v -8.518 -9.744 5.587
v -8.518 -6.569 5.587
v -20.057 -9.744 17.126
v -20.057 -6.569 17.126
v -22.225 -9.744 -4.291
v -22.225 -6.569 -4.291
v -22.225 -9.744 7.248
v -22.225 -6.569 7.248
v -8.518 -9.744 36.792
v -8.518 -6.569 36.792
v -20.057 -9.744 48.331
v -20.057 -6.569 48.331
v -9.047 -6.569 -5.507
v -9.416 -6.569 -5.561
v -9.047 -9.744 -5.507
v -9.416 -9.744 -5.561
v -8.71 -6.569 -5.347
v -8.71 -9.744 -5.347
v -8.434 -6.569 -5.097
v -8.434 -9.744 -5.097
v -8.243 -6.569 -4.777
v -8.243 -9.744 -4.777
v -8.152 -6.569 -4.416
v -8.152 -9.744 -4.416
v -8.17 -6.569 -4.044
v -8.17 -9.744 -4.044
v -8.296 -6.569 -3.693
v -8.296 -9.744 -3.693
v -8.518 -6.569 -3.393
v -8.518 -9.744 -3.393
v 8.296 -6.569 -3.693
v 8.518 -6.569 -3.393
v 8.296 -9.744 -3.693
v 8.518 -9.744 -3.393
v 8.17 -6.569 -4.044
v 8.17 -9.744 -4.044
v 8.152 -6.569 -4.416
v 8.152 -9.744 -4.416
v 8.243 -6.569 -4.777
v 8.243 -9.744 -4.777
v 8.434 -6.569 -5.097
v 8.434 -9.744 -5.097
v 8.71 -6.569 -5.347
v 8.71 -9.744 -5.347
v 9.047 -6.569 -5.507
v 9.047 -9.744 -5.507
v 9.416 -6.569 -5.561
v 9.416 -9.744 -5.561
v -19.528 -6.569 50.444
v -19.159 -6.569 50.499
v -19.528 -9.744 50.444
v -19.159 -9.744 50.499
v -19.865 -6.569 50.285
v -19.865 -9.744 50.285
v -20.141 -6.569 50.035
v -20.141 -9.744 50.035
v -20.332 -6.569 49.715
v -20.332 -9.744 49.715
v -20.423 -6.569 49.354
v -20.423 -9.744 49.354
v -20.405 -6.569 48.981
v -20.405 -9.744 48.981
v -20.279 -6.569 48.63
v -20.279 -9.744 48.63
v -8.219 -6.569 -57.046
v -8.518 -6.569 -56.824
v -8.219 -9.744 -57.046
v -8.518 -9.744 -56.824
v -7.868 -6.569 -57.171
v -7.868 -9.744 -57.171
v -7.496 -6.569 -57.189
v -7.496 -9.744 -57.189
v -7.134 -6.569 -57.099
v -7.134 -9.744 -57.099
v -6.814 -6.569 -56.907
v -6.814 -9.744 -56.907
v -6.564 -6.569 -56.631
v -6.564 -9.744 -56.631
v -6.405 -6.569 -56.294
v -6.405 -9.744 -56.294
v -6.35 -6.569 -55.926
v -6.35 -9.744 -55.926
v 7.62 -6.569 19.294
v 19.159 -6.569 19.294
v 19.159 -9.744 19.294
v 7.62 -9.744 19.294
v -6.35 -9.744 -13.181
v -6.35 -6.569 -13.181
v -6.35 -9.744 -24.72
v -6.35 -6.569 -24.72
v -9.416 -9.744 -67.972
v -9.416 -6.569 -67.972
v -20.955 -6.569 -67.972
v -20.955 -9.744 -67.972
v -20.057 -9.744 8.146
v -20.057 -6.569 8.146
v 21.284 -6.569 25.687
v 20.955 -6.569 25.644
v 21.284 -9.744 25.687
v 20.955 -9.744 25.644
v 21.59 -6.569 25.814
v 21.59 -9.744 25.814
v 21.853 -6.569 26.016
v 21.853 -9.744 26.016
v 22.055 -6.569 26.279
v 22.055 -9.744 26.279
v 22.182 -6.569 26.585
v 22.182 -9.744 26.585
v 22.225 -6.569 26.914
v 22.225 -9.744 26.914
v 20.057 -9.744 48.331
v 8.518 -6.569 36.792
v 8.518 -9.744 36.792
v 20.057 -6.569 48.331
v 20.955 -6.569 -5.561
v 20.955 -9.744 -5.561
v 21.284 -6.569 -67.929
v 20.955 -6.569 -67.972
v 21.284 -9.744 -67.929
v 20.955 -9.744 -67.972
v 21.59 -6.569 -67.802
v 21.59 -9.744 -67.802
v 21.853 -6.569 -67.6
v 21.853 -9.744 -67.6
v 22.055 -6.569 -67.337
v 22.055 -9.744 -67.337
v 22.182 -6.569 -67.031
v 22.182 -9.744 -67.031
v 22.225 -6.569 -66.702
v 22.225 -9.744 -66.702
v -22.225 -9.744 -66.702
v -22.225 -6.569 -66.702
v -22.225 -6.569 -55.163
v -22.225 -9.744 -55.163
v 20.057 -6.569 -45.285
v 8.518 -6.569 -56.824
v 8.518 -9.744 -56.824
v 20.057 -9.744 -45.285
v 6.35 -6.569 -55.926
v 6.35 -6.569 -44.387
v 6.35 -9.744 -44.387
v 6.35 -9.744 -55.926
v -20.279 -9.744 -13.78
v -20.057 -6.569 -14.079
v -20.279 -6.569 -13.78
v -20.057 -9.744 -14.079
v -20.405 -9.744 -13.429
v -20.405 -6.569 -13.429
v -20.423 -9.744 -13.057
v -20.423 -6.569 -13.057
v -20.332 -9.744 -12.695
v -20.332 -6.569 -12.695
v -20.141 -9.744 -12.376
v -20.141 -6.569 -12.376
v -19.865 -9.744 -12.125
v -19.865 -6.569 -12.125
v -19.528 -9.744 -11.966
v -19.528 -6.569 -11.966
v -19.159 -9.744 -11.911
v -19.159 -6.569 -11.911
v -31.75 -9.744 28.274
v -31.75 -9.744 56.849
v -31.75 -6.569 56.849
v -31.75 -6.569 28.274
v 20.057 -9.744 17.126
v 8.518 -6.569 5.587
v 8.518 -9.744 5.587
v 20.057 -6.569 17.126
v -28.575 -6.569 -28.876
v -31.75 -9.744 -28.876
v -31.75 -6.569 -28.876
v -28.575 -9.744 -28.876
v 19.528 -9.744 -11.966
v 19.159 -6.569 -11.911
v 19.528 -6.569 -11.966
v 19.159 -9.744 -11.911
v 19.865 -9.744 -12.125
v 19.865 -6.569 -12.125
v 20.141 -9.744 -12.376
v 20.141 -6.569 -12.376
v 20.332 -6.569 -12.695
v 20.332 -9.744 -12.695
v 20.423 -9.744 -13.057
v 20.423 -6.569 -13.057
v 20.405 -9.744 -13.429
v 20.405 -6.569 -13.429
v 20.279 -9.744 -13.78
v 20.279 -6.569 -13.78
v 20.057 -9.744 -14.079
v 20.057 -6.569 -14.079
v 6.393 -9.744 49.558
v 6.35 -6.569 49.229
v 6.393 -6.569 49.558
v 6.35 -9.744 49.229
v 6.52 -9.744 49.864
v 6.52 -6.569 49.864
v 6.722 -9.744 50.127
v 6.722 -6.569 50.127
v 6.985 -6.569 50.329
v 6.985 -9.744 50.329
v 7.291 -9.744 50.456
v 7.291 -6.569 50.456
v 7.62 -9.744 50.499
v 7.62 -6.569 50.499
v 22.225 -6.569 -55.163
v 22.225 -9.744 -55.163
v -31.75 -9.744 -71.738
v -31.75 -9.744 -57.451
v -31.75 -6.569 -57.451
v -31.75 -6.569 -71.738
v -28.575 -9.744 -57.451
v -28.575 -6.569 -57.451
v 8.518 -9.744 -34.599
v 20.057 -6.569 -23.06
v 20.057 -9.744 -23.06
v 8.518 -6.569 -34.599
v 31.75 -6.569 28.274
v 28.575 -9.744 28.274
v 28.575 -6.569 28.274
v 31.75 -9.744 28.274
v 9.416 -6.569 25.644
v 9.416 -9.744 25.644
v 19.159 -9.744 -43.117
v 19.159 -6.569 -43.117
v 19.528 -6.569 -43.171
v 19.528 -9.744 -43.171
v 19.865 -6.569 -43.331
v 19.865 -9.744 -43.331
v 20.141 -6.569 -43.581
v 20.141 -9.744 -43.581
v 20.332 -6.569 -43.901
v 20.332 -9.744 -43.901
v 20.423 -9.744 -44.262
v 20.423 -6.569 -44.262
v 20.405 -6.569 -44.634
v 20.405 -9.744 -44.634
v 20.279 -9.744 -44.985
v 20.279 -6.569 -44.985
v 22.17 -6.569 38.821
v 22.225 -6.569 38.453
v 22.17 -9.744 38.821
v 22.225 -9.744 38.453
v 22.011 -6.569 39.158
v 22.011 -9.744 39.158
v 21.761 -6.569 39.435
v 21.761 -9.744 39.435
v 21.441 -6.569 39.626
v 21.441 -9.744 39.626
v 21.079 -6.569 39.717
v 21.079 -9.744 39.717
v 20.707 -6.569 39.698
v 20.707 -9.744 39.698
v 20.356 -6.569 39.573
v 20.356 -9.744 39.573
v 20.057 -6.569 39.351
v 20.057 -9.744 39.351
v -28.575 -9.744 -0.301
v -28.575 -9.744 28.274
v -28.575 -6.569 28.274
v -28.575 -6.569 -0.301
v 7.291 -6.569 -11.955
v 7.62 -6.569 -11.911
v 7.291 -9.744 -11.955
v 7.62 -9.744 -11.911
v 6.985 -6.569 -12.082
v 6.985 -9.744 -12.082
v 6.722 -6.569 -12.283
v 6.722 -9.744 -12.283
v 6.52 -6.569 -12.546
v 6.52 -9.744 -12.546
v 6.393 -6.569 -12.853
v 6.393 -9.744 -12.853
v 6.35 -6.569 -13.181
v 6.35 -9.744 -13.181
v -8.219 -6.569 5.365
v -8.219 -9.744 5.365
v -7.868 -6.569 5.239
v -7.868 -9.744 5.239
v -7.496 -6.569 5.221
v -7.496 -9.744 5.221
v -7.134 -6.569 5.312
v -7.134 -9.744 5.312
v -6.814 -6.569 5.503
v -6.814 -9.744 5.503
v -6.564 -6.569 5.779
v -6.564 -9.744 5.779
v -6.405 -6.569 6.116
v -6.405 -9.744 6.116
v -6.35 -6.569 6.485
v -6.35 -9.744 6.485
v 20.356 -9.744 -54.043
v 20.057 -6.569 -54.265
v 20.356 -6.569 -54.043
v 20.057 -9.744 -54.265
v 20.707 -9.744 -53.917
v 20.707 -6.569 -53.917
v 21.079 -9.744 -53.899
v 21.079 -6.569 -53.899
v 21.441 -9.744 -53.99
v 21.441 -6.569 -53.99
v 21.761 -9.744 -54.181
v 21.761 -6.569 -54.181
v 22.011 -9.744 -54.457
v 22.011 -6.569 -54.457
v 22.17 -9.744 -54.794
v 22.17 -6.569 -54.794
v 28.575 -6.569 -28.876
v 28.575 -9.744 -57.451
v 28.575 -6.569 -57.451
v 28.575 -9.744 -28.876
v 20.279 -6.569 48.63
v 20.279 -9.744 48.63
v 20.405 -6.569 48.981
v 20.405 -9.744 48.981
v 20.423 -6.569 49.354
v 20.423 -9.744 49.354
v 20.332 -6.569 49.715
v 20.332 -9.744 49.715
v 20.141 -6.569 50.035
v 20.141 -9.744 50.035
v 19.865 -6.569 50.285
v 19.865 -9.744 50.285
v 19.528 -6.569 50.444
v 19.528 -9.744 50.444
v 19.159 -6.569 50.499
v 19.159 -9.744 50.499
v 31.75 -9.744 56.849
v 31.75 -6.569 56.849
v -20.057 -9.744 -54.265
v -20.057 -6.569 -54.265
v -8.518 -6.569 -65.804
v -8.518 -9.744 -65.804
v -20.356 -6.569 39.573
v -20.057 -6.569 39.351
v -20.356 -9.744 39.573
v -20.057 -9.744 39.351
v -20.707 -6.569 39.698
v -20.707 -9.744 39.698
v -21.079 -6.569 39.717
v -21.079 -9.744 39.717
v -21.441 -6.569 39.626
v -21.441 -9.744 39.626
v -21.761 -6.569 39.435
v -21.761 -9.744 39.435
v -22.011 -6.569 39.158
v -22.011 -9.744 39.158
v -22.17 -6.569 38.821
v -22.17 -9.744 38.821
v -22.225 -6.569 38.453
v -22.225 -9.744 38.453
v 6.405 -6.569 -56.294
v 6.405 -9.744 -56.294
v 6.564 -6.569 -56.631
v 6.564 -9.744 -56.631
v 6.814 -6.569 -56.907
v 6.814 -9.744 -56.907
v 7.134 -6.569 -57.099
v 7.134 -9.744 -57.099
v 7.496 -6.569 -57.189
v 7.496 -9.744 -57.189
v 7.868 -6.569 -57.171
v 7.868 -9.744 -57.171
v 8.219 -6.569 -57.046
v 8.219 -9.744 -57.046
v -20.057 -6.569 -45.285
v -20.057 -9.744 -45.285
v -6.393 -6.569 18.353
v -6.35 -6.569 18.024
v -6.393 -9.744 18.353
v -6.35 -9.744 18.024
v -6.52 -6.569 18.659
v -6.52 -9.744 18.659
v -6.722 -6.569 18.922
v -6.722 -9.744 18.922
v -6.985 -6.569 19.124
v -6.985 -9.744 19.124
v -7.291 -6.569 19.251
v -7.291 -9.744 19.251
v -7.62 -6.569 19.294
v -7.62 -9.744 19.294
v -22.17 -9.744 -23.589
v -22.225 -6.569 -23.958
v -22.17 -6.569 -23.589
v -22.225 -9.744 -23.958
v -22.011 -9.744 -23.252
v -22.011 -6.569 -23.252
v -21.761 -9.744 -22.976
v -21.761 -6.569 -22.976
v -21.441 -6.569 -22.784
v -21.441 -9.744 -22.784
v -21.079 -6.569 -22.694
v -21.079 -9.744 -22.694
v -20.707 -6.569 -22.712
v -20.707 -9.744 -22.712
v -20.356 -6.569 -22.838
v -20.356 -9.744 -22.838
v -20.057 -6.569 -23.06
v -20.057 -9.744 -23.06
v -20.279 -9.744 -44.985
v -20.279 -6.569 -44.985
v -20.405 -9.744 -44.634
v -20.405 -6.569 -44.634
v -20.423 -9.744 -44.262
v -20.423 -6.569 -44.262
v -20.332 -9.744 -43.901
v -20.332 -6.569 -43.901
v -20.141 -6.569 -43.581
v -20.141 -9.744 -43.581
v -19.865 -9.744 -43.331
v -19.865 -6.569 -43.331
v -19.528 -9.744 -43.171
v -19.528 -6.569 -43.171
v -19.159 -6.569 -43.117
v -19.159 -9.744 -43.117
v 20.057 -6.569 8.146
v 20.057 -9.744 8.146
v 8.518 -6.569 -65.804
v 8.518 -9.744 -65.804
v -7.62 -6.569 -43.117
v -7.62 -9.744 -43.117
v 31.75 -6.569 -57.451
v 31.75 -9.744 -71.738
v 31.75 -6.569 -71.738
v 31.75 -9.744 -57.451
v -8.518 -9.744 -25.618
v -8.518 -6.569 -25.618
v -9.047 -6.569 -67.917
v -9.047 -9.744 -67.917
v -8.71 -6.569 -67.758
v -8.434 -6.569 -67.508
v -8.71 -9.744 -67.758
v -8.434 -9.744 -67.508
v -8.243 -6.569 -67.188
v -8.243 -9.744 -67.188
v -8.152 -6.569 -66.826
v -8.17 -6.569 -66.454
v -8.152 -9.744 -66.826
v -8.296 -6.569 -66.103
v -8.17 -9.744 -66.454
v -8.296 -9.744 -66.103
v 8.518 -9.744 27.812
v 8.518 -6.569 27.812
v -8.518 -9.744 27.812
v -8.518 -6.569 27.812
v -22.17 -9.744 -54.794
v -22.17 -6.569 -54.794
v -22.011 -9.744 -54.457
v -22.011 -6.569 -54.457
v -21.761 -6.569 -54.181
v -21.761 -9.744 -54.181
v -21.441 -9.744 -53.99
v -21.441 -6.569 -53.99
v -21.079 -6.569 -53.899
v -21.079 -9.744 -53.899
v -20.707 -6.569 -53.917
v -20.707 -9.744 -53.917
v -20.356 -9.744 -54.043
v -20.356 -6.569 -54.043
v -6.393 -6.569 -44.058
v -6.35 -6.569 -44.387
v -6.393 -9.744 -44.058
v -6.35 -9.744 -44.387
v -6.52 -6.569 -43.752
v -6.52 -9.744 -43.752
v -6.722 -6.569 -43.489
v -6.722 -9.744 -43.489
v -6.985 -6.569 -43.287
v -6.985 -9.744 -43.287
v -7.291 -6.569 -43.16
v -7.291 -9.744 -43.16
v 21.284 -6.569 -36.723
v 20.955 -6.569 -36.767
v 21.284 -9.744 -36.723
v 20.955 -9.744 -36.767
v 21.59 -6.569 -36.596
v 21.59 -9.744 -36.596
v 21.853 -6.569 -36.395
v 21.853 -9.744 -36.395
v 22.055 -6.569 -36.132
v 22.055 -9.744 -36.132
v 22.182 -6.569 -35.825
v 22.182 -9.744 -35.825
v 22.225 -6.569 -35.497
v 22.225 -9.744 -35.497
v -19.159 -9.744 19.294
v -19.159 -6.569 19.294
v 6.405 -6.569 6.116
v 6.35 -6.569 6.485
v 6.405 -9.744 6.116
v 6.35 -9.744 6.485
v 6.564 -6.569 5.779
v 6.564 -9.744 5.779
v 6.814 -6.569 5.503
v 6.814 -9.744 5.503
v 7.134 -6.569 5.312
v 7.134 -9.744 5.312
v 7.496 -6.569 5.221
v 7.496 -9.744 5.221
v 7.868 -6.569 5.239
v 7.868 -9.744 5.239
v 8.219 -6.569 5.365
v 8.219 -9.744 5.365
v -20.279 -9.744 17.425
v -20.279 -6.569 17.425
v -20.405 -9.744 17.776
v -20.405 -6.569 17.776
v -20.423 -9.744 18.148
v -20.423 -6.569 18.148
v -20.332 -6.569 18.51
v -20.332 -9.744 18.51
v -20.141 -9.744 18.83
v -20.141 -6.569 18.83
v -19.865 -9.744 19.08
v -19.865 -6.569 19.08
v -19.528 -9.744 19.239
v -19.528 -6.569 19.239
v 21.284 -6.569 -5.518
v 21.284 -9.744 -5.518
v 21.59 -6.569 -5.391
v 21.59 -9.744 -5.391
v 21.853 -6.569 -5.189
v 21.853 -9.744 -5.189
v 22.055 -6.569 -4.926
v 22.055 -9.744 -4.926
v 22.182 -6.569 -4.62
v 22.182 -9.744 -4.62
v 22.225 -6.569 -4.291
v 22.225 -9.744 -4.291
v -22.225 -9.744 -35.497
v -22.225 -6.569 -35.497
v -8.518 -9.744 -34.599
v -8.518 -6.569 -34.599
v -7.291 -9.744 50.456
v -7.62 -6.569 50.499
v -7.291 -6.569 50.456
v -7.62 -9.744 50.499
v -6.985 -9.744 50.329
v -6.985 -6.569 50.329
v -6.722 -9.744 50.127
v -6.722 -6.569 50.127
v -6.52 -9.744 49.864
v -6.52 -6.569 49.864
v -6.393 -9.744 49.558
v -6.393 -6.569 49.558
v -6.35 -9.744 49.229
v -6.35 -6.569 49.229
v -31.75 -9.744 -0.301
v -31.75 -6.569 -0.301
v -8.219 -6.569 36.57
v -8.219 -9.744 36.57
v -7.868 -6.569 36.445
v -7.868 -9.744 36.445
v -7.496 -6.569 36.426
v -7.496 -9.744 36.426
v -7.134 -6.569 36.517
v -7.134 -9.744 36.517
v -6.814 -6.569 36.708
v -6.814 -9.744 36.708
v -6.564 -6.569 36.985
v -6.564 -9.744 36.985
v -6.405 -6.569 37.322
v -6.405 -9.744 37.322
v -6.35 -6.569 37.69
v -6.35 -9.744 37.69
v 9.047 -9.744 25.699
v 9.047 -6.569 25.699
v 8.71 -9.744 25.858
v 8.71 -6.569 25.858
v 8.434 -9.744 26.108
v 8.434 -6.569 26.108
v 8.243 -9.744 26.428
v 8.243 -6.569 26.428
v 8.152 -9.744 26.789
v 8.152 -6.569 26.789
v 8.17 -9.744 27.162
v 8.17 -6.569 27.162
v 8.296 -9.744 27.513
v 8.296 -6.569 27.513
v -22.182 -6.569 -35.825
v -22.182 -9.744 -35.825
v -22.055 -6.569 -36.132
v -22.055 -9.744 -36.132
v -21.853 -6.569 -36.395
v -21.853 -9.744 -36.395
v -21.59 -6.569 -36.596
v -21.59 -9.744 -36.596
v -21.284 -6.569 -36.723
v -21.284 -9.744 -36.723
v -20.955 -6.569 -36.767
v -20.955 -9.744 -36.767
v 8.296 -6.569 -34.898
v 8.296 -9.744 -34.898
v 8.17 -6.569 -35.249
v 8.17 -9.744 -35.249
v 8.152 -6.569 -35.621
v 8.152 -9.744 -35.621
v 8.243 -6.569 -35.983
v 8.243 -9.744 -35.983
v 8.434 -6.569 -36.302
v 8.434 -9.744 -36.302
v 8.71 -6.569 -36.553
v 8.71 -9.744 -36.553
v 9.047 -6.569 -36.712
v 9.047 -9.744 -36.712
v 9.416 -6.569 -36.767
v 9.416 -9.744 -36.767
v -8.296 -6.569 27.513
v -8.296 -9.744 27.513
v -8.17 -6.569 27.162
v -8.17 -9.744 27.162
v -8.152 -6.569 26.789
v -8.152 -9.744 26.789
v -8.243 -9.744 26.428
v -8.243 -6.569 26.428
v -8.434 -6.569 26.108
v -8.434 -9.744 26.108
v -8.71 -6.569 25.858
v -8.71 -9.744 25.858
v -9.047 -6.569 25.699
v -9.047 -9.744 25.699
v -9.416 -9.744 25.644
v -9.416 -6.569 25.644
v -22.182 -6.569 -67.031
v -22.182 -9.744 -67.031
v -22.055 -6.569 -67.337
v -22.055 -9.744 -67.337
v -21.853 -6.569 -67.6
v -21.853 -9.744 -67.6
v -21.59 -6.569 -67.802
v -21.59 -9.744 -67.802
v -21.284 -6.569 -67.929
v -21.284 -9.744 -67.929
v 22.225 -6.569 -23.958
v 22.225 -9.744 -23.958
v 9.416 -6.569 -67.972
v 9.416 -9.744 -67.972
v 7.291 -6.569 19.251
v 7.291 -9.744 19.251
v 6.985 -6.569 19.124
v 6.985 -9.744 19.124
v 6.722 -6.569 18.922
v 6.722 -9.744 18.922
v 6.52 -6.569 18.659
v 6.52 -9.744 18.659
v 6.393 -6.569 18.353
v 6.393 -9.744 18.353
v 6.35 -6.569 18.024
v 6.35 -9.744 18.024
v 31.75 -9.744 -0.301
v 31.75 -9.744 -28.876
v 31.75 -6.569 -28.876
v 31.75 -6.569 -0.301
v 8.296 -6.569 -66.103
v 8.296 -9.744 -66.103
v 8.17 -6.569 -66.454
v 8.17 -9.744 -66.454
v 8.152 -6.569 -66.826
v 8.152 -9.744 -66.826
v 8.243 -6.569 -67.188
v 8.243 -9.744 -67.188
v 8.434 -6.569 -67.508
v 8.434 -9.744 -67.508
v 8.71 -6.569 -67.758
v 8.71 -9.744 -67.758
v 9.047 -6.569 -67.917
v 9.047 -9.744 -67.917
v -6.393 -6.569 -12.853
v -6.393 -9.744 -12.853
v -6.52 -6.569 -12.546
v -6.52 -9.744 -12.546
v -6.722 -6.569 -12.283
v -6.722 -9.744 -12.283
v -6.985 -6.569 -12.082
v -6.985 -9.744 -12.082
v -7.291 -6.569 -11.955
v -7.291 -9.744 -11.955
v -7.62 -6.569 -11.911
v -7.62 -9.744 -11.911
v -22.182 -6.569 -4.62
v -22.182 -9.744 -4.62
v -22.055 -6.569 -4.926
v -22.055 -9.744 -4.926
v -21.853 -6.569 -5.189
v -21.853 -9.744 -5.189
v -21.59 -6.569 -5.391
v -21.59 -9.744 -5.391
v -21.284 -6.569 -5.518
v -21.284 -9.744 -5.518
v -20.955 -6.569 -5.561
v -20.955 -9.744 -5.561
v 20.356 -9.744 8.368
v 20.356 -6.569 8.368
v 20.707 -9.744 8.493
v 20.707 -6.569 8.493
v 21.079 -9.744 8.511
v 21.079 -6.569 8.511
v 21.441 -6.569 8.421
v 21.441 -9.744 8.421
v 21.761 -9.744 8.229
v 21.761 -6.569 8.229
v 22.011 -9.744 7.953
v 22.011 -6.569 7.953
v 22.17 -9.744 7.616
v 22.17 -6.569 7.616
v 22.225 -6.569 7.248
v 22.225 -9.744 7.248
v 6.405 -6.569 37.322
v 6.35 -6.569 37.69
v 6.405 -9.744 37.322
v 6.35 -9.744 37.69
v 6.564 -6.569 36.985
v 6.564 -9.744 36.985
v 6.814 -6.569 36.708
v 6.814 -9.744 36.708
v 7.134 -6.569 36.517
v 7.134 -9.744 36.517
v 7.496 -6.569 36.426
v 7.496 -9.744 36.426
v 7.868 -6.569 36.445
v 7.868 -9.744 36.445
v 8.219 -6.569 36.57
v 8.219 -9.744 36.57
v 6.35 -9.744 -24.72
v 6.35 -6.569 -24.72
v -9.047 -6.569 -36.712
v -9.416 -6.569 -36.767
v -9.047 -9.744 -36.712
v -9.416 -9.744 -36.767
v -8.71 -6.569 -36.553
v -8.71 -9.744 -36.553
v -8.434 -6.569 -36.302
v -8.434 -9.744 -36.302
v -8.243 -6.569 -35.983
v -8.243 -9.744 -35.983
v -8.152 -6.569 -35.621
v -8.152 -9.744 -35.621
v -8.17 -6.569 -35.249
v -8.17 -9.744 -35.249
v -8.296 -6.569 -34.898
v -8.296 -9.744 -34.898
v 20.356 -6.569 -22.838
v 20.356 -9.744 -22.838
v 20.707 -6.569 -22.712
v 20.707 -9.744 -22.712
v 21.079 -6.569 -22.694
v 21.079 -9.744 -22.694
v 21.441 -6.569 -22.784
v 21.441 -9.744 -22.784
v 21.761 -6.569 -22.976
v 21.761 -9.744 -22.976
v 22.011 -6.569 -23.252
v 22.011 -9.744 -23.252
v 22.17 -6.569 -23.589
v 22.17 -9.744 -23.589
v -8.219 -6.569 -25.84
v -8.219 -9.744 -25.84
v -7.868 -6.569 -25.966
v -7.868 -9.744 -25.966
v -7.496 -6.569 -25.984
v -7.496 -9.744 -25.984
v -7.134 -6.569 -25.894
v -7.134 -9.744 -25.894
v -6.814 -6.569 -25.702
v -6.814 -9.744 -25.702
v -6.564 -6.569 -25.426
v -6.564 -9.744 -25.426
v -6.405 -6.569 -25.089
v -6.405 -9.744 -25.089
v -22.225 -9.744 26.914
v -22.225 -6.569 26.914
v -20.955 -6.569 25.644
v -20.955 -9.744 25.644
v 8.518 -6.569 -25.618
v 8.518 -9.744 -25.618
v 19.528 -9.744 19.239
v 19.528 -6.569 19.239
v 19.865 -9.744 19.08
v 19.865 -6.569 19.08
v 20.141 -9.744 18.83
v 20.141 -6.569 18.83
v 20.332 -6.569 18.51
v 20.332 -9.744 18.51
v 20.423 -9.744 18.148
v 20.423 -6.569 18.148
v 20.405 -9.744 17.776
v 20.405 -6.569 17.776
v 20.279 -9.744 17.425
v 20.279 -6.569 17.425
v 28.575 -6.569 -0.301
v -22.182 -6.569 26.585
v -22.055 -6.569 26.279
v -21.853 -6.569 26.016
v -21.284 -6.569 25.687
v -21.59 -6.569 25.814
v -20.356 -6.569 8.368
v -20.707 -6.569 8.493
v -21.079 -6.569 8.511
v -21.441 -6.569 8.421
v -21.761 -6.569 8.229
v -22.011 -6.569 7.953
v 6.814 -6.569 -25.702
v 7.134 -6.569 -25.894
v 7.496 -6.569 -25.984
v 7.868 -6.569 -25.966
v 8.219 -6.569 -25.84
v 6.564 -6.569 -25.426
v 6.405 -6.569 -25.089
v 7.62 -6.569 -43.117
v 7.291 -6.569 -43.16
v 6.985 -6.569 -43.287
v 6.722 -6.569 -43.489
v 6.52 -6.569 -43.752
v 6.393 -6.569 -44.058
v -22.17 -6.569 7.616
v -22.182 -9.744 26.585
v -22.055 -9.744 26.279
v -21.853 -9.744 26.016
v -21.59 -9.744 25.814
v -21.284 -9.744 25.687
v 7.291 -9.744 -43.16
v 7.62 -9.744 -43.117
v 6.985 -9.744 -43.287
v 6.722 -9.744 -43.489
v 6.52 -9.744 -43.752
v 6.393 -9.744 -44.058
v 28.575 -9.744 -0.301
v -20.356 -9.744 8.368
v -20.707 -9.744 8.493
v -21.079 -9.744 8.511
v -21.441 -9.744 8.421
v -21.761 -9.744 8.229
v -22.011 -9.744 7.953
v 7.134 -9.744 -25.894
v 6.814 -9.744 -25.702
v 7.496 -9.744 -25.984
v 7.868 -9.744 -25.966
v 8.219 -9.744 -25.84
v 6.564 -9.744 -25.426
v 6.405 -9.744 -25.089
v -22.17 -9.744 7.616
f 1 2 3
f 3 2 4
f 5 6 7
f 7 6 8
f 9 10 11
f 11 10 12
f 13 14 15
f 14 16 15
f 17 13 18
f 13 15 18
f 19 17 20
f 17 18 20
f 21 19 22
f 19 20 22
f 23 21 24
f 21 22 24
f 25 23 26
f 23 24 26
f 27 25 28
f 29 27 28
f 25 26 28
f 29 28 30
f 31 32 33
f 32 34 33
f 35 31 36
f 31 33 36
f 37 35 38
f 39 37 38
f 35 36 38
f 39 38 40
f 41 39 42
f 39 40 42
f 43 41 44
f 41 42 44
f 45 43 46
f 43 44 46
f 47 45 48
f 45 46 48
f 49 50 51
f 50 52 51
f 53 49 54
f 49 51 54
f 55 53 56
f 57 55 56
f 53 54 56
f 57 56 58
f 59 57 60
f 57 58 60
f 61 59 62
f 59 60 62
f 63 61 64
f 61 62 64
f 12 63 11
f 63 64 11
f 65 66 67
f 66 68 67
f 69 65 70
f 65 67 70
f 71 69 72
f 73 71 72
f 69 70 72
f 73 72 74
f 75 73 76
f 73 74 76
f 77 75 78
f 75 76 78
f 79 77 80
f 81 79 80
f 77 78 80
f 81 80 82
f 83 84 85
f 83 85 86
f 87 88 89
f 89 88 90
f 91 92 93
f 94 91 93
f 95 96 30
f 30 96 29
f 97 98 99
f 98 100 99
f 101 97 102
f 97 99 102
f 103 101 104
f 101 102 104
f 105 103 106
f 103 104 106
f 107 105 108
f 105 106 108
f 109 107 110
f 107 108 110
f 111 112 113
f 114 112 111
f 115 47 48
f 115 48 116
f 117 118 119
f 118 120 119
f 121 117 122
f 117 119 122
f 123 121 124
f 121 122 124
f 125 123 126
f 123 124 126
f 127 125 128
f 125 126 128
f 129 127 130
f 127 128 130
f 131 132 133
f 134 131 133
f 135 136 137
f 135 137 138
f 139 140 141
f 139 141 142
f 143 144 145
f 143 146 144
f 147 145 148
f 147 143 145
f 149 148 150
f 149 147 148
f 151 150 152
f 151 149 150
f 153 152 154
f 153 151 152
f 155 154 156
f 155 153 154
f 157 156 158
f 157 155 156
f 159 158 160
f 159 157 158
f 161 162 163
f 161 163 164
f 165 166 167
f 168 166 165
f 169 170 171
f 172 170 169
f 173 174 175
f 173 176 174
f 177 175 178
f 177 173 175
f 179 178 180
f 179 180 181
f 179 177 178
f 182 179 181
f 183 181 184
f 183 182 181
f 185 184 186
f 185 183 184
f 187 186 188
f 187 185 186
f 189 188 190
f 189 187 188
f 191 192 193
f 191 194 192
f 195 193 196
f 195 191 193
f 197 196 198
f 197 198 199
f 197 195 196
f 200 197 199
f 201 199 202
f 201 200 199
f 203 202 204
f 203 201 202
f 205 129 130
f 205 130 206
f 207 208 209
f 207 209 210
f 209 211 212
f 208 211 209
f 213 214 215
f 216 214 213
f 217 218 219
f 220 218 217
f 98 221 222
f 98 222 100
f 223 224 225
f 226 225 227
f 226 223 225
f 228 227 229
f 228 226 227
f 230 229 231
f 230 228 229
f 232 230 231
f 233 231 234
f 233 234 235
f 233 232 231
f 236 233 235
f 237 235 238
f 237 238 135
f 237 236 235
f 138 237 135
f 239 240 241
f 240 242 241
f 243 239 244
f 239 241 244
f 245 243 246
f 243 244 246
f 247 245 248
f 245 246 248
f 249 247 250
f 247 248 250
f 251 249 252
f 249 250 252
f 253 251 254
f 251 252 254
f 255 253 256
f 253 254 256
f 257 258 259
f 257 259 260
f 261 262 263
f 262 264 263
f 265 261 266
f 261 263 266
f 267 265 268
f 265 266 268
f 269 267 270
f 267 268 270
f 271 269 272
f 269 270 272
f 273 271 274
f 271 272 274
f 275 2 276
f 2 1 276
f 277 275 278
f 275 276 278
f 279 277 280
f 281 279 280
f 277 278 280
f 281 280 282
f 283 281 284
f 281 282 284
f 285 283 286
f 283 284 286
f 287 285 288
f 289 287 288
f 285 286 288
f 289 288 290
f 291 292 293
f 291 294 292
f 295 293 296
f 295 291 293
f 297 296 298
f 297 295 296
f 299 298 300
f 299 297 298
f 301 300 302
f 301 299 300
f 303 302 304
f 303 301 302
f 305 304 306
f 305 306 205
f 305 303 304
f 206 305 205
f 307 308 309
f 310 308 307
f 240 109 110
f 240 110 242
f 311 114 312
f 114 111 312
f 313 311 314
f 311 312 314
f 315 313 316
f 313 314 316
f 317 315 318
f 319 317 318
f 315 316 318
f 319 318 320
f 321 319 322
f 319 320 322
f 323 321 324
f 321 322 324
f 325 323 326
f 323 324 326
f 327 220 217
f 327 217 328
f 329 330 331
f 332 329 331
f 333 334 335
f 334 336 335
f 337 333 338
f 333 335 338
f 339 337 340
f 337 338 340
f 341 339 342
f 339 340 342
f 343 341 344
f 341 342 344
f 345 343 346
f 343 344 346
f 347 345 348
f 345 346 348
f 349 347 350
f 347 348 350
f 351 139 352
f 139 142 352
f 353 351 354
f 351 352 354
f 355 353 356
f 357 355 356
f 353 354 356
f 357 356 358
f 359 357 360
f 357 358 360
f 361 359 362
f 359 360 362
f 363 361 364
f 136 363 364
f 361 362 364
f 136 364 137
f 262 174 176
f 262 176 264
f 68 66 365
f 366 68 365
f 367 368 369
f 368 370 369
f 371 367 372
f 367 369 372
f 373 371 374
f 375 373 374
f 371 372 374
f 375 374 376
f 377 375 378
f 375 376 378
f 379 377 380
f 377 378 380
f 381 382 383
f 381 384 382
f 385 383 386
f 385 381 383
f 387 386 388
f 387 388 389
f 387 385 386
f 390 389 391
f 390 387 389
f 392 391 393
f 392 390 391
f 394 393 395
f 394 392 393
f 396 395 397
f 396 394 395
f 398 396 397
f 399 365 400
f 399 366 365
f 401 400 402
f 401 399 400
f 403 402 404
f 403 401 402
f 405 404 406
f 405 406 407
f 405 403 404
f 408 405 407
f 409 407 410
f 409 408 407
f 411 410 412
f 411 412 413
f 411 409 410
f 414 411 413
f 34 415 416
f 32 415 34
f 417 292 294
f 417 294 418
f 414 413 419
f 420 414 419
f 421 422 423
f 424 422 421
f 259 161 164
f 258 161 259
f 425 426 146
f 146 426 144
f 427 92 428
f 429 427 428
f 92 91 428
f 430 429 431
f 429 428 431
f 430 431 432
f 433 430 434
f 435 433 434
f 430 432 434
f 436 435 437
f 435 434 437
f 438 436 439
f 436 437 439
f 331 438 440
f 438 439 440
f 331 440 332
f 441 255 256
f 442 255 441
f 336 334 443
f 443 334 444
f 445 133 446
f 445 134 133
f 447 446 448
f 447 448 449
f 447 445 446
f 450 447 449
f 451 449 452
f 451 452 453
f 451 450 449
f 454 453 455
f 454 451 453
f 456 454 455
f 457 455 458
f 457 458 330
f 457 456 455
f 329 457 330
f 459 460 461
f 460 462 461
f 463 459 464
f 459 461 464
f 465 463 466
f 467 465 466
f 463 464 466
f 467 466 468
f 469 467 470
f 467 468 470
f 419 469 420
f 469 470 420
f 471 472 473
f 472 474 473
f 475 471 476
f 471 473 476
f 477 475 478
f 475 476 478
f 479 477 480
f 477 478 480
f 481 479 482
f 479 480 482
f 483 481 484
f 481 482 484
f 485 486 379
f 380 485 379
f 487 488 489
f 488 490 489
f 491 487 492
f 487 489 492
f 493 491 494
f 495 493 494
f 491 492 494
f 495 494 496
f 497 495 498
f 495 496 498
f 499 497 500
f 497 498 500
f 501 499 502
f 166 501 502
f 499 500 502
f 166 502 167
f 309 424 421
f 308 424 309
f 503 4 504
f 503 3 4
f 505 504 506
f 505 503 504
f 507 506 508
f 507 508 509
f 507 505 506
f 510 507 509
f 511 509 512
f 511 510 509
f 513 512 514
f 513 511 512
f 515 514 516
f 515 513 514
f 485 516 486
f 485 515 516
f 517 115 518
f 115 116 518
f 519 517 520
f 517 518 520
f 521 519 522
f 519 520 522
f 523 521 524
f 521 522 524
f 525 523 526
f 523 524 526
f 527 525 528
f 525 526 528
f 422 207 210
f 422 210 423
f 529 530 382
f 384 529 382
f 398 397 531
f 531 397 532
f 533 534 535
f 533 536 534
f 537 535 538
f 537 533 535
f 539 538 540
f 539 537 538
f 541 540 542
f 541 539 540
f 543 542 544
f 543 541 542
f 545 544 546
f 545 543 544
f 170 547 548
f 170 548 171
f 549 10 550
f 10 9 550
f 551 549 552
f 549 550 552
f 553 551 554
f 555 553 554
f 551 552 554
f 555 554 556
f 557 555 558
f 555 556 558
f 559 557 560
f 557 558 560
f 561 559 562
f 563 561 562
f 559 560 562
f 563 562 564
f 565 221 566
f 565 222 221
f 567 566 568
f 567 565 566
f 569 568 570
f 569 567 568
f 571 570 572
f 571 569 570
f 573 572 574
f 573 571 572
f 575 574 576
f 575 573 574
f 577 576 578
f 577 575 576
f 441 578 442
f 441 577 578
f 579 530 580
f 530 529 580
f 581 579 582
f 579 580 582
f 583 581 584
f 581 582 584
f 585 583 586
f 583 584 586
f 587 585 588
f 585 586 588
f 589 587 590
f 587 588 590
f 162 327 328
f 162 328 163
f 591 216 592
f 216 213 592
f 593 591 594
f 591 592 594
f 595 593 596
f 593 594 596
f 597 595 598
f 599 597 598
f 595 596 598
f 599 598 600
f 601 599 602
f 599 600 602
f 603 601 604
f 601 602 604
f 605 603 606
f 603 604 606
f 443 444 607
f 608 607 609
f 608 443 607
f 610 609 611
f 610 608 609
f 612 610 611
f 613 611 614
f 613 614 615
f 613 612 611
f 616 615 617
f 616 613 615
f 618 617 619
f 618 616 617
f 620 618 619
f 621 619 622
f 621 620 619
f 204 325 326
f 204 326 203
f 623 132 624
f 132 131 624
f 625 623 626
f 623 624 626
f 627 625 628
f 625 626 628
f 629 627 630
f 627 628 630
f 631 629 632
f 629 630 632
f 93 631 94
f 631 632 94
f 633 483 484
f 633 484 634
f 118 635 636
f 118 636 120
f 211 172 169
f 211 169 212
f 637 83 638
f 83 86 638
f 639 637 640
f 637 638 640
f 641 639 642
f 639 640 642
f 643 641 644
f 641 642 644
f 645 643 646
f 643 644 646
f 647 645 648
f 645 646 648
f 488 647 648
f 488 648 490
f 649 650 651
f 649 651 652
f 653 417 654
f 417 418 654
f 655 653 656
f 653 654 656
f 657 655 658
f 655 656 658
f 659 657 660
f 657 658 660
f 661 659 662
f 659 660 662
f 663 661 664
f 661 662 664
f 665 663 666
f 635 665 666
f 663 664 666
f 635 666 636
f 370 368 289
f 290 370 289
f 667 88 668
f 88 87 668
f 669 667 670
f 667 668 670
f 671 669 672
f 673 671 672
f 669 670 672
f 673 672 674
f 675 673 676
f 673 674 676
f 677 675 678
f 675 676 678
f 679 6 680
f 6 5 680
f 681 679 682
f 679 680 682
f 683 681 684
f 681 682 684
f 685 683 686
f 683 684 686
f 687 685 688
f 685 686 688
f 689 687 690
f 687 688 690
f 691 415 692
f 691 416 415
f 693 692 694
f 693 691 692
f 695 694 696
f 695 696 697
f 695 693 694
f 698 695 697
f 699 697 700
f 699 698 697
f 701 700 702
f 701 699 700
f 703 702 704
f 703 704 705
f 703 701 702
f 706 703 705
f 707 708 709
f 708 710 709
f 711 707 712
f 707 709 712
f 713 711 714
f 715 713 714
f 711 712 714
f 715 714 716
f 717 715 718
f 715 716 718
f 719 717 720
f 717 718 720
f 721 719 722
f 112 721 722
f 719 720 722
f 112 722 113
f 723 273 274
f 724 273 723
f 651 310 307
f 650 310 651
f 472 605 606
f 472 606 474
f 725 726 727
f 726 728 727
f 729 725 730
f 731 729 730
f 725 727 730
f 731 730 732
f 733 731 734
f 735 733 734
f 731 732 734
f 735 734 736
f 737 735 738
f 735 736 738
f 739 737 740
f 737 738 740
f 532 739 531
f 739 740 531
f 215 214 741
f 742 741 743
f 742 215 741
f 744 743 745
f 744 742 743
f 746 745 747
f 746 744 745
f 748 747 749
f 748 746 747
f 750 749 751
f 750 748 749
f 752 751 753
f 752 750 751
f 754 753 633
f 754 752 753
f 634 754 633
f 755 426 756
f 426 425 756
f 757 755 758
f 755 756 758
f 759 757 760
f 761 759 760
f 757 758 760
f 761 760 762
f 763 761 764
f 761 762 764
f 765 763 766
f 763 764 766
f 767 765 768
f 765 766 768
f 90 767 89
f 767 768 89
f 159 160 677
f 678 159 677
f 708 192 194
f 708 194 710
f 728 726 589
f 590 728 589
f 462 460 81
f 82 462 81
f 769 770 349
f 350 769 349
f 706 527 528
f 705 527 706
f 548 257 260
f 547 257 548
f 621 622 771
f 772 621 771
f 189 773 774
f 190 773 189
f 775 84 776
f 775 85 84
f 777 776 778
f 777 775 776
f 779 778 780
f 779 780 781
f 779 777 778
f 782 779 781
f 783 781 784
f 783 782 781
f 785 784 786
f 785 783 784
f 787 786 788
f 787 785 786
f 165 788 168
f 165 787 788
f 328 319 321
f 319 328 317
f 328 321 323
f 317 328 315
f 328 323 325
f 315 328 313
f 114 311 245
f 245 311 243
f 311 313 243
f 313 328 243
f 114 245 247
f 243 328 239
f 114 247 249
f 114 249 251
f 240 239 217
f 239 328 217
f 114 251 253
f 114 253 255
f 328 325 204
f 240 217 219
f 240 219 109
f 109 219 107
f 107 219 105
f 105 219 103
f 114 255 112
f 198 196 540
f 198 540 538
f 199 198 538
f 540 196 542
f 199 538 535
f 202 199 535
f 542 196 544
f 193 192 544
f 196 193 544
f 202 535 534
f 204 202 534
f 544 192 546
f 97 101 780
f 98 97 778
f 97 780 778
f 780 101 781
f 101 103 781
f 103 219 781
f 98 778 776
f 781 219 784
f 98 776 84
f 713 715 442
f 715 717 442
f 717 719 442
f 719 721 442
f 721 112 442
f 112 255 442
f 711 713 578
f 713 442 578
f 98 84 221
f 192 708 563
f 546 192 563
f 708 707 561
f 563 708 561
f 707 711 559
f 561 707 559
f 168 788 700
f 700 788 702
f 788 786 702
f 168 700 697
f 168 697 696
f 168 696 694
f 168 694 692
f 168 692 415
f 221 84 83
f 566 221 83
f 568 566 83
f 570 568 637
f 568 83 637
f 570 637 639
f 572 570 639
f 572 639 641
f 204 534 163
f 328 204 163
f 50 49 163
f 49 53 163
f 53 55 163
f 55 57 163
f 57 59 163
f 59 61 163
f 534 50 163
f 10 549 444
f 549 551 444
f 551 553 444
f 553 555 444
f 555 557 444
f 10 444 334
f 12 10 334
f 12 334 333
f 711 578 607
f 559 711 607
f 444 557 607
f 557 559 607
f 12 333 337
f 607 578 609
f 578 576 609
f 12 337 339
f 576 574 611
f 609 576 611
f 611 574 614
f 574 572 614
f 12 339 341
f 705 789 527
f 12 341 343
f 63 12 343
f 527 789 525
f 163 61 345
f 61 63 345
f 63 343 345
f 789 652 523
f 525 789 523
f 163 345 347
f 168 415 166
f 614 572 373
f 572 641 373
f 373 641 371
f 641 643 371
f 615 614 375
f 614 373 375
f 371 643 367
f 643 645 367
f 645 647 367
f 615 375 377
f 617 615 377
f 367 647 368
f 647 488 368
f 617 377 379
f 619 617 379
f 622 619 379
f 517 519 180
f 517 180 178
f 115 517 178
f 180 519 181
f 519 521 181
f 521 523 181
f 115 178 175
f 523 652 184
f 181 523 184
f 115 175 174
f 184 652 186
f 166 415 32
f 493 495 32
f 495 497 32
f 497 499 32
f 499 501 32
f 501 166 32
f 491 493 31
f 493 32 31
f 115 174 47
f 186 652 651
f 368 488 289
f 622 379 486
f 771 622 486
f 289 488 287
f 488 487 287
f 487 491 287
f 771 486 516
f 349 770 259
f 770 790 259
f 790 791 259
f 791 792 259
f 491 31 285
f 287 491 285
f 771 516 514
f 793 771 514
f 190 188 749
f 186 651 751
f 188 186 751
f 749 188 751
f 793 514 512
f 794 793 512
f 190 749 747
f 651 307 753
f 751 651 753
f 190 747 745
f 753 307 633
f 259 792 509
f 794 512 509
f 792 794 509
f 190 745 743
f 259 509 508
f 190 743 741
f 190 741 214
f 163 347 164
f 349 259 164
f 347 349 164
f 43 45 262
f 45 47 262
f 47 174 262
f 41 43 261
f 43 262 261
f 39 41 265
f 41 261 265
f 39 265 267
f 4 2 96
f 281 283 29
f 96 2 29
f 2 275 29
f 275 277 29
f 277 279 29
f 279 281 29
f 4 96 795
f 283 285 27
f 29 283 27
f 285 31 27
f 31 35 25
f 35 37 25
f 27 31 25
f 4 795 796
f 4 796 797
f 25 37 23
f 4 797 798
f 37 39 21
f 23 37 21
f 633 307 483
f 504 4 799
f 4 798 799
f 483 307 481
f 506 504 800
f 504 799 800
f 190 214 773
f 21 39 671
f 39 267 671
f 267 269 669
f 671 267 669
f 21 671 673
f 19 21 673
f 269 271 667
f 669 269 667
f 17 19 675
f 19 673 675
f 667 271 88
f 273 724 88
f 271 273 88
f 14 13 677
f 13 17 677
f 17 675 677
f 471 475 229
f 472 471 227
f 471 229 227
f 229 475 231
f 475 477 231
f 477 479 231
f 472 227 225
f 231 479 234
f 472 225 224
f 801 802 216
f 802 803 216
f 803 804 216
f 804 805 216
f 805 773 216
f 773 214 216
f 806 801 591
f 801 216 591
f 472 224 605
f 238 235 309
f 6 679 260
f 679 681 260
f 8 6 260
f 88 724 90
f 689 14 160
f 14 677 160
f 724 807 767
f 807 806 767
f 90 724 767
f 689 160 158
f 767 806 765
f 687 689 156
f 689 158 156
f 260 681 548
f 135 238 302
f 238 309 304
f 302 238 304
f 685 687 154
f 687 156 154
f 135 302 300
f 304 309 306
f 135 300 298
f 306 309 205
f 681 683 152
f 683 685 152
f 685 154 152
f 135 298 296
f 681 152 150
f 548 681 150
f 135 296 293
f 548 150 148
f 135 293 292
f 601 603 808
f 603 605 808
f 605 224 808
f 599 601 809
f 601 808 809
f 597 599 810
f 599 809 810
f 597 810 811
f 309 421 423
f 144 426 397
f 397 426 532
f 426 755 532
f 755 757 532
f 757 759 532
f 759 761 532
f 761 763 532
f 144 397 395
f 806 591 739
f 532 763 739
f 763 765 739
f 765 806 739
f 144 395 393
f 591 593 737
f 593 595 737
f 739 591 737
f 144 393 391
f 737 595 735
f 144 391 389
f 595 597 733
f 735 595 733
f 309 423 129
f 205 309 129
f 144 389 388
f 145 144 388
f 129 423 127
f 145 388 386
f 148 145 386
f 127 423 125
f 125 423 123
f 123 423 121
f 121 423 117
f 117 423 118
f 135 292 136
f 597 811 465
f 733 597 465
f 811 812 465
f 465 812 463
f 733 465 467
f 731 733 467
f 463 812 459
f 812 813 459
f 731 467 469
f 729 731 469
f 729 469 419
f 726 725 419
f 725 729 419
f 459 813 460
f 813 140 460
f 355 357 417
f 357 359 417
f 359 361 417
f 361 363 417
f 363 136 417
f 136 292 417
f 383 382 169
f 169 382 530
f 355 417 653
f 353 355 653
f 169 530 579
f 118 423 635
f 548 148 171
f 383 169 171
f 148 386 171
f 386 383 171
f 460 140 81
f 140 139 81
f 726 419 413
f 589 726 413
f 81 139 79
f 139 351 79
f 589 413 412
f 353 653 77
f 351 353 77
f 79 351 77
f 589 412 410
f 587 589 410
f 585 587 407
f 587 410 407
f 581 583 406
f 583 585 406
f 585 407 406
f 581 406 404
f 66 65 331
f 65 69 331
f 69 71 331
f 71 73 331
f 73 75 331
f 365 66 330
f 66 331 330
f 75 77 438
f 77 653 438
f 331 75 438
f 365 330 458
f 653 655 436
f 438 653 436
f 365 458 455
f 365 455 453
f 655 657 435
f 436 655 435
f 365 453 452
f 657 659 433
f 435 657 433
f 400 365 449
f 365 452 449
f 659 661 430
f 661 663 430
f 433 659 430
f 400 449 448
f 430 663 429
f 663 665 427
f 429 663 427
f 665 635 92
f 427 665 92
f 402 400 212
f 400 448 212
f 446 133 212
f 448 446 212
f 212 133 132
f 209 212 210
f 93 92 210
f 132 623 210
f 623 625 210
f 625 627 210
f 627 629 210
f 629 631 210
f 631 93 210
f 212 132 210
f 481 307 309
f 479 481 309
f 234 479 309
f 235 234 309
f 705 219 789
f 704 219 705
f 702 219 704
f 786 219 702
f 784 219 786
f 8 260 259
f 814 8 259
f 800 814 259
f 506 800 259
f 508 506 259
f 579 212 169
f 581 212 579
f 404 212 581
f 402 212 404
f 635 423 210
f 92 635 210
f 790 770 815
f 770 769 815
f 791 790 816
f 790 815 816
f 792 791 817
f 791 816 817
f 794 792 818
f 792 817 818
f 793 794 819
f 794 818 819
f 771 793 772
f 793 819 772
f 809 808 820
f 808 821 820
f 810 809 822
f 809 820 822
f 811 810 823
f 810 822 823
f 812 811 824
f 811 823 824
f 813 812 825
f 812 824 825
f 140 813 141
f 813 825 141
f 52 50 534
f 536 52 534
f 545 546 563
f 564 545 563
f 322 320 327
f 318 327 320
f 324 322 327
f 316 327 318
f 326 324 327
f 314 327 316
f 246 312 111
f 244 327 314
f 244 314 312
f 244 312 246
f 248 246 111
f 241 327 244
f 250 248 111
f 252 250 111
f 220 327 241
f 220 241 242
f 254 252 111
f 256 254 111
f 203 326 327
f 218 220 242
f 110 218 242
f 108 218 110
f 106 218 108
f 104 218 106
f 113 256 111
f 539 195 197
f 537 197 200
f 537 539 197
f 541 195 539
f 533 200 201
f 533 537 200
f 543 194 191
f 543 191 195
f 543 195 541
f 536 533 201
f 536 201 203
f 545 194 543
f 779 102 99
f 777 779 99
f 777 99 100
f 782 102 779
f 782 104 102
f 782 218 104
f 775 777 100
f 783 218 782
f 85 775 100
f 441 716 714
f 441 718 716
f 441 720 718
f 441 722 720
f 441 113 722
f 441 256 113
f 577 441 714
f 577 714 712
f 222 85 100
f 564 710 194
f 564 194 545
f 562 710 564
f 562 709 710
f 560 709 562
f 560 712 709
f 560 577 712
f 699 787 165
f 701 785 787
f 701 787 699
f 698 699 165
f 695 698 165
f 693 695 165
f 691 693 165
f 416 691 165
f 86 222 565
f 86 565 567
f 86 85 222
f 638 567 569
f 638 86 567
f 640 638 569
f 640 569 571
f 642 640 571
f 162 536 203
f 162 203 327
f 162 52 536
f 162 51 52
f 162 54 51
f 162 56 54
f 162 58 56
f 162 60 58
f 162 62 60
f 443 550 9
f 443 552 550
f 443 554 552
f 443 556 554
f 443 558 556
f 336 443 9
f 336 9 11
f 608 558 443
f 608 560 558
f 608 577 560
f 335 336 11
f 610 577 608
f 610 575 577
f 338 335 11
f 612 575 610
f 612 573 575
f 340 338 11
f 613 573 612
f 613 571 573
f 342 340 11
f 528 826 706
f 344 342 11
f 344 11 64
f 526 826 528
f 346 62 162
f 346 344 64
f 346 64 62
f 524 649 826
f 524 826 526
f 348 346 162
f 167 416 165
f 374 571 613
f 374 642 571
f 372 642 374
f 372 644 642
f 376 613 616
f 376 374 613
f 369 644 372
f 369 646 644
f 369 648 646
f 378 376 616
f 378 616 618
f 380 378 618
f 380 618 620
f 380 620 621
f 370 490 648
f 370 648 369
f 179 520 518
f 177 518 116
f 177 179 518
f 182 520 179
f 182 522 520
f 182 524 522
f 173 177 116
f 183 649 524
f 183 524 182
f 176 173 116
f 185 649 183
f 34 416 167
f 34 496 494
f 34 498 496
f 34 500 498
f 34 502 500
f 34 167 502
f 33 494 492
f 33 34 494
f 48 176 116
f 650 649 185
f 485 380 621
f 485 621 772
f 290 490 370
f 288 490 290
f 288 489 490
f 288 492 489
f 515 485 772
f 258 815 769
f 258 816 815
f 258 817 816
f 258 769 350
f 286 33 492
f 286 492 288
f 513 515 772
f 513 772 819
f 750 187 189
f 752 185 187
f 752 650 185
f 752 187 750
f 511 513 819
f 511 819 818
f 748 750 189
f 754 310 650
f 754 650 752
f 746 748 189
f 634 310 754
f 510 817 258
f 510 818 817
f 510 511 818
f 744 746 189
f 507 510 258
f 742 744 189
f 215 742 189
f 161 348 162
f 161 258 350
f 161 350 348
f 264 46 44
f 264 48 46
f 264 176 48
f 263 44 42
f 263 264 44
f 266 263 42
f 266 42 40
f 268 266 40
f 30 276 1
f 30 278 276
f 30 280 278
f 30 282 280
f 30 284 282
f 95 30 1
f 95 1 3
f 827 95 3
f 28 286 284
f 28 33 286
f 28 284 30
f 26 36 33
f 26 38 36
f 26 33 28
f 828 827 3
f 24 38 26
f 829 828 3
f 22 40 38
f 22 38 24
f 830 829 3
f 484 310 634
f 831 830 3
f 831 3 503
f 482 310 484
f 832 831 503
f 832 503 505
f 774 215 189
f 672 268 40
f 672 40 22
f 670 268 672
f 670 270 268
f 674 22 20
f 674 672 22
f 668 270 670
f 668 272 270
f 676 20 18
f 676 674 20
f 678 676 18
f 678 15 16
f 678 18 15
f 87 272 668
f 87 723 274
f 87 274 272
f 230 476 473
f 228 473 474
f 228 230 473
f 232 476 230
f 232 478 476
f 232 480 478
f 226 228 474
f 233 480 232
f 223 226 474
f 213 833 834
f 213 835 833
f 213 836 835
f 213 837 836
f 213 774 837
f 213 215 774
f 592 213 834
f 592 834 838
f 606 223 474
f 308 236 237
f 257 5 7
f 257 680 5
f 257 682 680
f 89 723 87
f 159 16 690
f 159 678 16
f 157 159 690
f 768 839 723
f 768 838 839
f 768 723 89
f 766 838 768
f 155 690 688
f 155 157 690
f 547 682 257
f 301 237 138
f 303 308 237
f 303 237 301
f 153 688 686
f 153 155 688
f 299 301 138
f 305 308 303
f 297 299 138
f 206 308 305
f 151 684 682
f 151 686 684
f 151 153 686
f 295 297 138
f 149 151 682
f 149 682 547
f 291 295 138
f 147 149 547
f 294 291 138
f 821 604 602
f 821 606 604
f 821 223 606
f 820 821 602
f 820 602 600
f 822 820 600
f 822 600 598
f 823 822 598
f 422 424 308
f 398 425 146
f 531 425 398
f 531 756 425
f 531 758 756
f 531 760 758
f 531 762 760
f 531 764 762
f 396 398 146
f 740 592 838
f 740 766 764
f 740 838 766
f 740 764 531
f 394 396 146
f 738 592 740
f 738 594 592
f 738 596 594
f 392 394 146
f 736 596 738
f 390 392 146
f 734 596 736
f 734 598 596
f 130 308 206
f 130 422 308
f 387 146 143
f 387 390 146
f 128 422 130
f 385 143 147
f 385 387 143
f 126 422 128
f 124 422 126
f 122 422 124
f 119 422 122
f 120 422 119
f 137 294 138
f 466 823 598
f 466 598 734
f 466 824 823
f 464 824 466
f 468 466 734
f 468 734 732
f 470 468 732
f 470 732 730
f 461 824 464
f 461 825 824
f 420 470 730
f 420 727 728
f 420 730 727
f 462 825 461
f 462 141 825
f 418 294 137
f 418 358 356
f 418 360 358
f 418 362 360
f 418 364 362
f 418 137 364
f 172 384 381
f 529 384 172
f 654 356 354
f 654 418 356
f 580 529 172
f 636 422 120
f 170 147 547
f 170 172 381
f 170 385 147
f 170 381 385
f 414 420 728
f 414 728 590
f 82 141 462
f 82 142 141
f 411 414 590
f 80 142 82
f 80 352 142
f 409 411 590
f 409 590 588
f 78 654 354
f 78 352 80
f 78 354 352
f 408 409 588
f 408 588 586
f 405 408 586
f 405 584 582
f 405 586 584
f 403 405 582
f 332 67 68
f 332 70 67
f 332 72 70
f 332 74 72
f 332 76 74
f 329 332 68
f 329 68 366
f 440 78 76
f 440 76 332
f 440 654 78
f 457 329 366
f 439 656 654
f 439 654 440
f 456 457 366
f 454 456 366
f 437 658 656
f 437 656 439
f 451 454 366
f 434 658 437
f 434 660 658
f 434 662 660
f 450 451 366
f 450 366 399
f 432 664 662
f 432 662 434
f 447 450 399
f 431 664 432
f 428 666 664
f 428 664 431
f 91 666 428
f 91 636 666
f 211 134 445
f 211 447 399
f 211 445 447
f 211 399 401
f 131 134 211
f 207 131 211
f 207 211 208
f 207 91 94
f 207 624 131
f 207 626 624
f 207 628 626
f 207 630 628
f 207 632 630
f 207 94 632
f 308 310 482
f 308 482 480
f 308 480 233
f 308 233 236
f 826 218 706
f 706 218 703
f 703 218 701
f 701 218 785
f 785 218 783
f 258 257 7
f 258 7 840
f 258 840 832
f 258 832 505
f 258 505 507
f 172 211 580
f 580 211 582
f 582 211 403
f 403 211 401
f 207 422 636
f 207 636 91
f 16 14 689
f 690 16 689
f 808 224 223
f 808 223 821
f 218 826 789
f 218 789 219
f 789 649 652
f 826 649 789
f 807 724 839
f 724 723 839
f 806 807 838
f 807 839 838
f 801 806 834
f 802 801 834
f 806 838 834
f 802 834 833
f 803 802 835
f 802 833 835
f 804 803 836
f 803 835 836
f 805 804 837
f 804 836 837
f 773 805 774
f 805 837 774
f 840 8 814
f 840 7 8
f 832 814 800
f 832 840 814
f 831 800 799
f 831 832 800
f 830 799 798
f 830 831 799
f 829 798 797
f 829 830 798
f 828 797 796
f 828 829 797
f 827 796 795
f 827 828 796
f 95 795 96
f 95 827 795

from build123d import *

# Parameters (mm, degrees)
BOSS_EXTRUDE1_DEPTH  = 3.175
CUT_EXTRUDE1_DEPTH   = 4.175
FILLET1_R            = 1.27
FILLET1_OF_MIRROR1_R = 1.27


with BuildPart() as part:
    # Sketch1 → Boss-Extrude1 (new body)
    with BuildSketch(Plane(origin=(0, -9.743731804, 0), x_dir=(1, 0, 0), z_dir=(0, 1, 0))):
        Polygon((28.575, 57.450862399), (28.575, 28.875862399), (31.75, 28.875862399), (31.75, 0.300862399), (28.575, 0.300862399), (28.575, -28.274137601), (31.75, -28.274137601), (31.75, -56.849137601), (-31.75, -56.849137601), (-31.75, -28.274137601), (-28.575, -28.274137601), (-28.575, 0.300862399), (-31.75, 0.300862399), (-31.75, 28.875862399), (-28.575, 28.875862399), (-28.575, 57.450862399), (-31.75, 57.450862399), (-31.75, 71.738362399), (31.75, 71.738362399), (31.75, 57.450862399), align=None)
    extrude(amount=BOSS_EXTRUDE1_DEPTH)

    # Sketch2 → Cut-Extrude1 (cut, through all)
    with BuildSketch(Plane(origin=(0, -6.568731804, 0), x_dir=(1, 0, 0), z_dir=(0, 1, 0))):
        Polygon((-22.225, -50.499137601), (-6.35, -50.499137601), (-6.35, -34.624137601), align=None)
        Polygon((-22.225, -41.51888148), (-6.35, -25.64388148), (-22.225, -25.64388148), align=None)
        Polygon((-6.35, -3.41888148), (-22.225, -19.29388148), (-6.35, -19.29388148), align=None)
        Polygon((-22.225, 5.561374641), (-22.225, -10.313625359), (-6.35, 5.561374641), align=None)
        Polygon((-6.35, 27.786374641), (-22.225, 11.911374641), (-6.35, 11.911374641), align=None)
        Polygon((-22.225, 36.766630762), (-22.225, 20.891630762), (-6.35, 36.766630762), align=None)
        Polygon((-6.35, 58.991630762), (-22.225, 43.116630762), (-6.35, 43.116630762), align=None)
        Polygon((-22.225, 67.971886883), (-22.225, 52.096886883), (-6.35, 67.971886883), align=None)
    cut_extrude1 = extrude(amount=-CUT_EXTRUDE1_DEPTH, mode=Mode.SUBTRACT)

    # Fillet1
    fillet1_edges = [part.edges().sort_by_distance(p)[0] for p in [
        (-22.225, -8.156231804, 41.51888148),
        (-22.225, -8.156231804, 25.64388148),
        (-6.35, -8.156231804, 25.64388148),
        (-6.35, -8.156231804, -67.971886883),
        (-22.225, -8.156231804, -52.096886883),
        (-22.225, -8.156231804, -67.971886883),
        (-6.35, -8.156231804, -43.116630762),
        (-22.225, -8.156231804, -43.116630762),
        (-6.35, -8.156231804, -58.991630762),
        (-6.35, -8.156231804, -36.766630762),
        (-22.225, -8.156231804, -20.891630762),
        (-22.225, -8.156231804, -36.766630762),
        (-22.225, -8.156231804, 50.499137601),
        (-6.35, -8.156231804, 34.624137601),
        (-6.35, -8.156231804, 50.499137601),
        (-6.35, -8.156231804, -11.911374641),
        (-22.225, -8.156231804, -11.911374641),
        (-6.35, -8.156231804, -27.786374641),
        (-6.35, -8.156231804, -5.561374641),
        (-22.225, -8.156231804, 10.313625359),
        (-22.225, -8.156231804, -5.561374641),
        (-6.35, -8.156231804, 19.29388148),
        (-22.225, -8.156231804, 19.29388148),
        (-6.35, -8.156231804, 3.41888148),
    ]]
    fillet(fillet1_edges, radius=FILLET1_R)

    # Mirror1: Cut-Extrude1 across plane
    add(cut_extrude1.mirror(Plane(origin=(0, 0, 0), x_dir=(0, 0, 1), z_dir=(1, 0, 0))), mode=Mode.SUBTRACT)

    # Fillet1 of Mirror1
    fillet1_of_mirror1_edges = [part.edges().sort_by_distance(p)[0] for p in [
        (22.225, -8.156231804, 41.51888148),
        (22.225, -8.156231804, 25.64388148),
        (6.35, -8.156231804, 25.64388148),
        (6.35, -8.156231804, -67.971886883),
        (22.225, -8.156231804, -52.096886883),
        (22.225, -8.156231804, -67.971886883),
        (6.35, -8.156231804, -43.116630762),
        (22.225, -8.156231804, -43.116630762),
        (6.35, -8.156231804, -58.991630762),
        (6.35, -8.156231804, -36.766630762),
        (22.225, -8.156231804, -20.891630762),
        (22.225, -8.156231804, -36.766630762),
        (22.225, -8.156231804, 50.499137601),
        (6.35, -8.156231804, 34.624137601),
        (6.35, -8.156231804, 50.499137601),
        (6.35, -8.156231804, -11.911374641),
        (22.225, -8.156231804, -11.911374641),
        (6.35, -8.156231804, -27.786374641),
        (6.35, -8.156231804, -5.561374641),
        (22.225, -8.156231804, 10.313625359),
        (22.225, -8.156231804, -5.561374641),
        (6.35, -8.156231804, 19.29388148),
        (22.225, -8.156231804, 19.29388148),
        (6.35, -8.156231804, 3.41888148),
    ]]
    fillet(fillet1_of_mirror1_edges, radius=FILLET1_OF_MIRROR1_R)


solid = part.part
